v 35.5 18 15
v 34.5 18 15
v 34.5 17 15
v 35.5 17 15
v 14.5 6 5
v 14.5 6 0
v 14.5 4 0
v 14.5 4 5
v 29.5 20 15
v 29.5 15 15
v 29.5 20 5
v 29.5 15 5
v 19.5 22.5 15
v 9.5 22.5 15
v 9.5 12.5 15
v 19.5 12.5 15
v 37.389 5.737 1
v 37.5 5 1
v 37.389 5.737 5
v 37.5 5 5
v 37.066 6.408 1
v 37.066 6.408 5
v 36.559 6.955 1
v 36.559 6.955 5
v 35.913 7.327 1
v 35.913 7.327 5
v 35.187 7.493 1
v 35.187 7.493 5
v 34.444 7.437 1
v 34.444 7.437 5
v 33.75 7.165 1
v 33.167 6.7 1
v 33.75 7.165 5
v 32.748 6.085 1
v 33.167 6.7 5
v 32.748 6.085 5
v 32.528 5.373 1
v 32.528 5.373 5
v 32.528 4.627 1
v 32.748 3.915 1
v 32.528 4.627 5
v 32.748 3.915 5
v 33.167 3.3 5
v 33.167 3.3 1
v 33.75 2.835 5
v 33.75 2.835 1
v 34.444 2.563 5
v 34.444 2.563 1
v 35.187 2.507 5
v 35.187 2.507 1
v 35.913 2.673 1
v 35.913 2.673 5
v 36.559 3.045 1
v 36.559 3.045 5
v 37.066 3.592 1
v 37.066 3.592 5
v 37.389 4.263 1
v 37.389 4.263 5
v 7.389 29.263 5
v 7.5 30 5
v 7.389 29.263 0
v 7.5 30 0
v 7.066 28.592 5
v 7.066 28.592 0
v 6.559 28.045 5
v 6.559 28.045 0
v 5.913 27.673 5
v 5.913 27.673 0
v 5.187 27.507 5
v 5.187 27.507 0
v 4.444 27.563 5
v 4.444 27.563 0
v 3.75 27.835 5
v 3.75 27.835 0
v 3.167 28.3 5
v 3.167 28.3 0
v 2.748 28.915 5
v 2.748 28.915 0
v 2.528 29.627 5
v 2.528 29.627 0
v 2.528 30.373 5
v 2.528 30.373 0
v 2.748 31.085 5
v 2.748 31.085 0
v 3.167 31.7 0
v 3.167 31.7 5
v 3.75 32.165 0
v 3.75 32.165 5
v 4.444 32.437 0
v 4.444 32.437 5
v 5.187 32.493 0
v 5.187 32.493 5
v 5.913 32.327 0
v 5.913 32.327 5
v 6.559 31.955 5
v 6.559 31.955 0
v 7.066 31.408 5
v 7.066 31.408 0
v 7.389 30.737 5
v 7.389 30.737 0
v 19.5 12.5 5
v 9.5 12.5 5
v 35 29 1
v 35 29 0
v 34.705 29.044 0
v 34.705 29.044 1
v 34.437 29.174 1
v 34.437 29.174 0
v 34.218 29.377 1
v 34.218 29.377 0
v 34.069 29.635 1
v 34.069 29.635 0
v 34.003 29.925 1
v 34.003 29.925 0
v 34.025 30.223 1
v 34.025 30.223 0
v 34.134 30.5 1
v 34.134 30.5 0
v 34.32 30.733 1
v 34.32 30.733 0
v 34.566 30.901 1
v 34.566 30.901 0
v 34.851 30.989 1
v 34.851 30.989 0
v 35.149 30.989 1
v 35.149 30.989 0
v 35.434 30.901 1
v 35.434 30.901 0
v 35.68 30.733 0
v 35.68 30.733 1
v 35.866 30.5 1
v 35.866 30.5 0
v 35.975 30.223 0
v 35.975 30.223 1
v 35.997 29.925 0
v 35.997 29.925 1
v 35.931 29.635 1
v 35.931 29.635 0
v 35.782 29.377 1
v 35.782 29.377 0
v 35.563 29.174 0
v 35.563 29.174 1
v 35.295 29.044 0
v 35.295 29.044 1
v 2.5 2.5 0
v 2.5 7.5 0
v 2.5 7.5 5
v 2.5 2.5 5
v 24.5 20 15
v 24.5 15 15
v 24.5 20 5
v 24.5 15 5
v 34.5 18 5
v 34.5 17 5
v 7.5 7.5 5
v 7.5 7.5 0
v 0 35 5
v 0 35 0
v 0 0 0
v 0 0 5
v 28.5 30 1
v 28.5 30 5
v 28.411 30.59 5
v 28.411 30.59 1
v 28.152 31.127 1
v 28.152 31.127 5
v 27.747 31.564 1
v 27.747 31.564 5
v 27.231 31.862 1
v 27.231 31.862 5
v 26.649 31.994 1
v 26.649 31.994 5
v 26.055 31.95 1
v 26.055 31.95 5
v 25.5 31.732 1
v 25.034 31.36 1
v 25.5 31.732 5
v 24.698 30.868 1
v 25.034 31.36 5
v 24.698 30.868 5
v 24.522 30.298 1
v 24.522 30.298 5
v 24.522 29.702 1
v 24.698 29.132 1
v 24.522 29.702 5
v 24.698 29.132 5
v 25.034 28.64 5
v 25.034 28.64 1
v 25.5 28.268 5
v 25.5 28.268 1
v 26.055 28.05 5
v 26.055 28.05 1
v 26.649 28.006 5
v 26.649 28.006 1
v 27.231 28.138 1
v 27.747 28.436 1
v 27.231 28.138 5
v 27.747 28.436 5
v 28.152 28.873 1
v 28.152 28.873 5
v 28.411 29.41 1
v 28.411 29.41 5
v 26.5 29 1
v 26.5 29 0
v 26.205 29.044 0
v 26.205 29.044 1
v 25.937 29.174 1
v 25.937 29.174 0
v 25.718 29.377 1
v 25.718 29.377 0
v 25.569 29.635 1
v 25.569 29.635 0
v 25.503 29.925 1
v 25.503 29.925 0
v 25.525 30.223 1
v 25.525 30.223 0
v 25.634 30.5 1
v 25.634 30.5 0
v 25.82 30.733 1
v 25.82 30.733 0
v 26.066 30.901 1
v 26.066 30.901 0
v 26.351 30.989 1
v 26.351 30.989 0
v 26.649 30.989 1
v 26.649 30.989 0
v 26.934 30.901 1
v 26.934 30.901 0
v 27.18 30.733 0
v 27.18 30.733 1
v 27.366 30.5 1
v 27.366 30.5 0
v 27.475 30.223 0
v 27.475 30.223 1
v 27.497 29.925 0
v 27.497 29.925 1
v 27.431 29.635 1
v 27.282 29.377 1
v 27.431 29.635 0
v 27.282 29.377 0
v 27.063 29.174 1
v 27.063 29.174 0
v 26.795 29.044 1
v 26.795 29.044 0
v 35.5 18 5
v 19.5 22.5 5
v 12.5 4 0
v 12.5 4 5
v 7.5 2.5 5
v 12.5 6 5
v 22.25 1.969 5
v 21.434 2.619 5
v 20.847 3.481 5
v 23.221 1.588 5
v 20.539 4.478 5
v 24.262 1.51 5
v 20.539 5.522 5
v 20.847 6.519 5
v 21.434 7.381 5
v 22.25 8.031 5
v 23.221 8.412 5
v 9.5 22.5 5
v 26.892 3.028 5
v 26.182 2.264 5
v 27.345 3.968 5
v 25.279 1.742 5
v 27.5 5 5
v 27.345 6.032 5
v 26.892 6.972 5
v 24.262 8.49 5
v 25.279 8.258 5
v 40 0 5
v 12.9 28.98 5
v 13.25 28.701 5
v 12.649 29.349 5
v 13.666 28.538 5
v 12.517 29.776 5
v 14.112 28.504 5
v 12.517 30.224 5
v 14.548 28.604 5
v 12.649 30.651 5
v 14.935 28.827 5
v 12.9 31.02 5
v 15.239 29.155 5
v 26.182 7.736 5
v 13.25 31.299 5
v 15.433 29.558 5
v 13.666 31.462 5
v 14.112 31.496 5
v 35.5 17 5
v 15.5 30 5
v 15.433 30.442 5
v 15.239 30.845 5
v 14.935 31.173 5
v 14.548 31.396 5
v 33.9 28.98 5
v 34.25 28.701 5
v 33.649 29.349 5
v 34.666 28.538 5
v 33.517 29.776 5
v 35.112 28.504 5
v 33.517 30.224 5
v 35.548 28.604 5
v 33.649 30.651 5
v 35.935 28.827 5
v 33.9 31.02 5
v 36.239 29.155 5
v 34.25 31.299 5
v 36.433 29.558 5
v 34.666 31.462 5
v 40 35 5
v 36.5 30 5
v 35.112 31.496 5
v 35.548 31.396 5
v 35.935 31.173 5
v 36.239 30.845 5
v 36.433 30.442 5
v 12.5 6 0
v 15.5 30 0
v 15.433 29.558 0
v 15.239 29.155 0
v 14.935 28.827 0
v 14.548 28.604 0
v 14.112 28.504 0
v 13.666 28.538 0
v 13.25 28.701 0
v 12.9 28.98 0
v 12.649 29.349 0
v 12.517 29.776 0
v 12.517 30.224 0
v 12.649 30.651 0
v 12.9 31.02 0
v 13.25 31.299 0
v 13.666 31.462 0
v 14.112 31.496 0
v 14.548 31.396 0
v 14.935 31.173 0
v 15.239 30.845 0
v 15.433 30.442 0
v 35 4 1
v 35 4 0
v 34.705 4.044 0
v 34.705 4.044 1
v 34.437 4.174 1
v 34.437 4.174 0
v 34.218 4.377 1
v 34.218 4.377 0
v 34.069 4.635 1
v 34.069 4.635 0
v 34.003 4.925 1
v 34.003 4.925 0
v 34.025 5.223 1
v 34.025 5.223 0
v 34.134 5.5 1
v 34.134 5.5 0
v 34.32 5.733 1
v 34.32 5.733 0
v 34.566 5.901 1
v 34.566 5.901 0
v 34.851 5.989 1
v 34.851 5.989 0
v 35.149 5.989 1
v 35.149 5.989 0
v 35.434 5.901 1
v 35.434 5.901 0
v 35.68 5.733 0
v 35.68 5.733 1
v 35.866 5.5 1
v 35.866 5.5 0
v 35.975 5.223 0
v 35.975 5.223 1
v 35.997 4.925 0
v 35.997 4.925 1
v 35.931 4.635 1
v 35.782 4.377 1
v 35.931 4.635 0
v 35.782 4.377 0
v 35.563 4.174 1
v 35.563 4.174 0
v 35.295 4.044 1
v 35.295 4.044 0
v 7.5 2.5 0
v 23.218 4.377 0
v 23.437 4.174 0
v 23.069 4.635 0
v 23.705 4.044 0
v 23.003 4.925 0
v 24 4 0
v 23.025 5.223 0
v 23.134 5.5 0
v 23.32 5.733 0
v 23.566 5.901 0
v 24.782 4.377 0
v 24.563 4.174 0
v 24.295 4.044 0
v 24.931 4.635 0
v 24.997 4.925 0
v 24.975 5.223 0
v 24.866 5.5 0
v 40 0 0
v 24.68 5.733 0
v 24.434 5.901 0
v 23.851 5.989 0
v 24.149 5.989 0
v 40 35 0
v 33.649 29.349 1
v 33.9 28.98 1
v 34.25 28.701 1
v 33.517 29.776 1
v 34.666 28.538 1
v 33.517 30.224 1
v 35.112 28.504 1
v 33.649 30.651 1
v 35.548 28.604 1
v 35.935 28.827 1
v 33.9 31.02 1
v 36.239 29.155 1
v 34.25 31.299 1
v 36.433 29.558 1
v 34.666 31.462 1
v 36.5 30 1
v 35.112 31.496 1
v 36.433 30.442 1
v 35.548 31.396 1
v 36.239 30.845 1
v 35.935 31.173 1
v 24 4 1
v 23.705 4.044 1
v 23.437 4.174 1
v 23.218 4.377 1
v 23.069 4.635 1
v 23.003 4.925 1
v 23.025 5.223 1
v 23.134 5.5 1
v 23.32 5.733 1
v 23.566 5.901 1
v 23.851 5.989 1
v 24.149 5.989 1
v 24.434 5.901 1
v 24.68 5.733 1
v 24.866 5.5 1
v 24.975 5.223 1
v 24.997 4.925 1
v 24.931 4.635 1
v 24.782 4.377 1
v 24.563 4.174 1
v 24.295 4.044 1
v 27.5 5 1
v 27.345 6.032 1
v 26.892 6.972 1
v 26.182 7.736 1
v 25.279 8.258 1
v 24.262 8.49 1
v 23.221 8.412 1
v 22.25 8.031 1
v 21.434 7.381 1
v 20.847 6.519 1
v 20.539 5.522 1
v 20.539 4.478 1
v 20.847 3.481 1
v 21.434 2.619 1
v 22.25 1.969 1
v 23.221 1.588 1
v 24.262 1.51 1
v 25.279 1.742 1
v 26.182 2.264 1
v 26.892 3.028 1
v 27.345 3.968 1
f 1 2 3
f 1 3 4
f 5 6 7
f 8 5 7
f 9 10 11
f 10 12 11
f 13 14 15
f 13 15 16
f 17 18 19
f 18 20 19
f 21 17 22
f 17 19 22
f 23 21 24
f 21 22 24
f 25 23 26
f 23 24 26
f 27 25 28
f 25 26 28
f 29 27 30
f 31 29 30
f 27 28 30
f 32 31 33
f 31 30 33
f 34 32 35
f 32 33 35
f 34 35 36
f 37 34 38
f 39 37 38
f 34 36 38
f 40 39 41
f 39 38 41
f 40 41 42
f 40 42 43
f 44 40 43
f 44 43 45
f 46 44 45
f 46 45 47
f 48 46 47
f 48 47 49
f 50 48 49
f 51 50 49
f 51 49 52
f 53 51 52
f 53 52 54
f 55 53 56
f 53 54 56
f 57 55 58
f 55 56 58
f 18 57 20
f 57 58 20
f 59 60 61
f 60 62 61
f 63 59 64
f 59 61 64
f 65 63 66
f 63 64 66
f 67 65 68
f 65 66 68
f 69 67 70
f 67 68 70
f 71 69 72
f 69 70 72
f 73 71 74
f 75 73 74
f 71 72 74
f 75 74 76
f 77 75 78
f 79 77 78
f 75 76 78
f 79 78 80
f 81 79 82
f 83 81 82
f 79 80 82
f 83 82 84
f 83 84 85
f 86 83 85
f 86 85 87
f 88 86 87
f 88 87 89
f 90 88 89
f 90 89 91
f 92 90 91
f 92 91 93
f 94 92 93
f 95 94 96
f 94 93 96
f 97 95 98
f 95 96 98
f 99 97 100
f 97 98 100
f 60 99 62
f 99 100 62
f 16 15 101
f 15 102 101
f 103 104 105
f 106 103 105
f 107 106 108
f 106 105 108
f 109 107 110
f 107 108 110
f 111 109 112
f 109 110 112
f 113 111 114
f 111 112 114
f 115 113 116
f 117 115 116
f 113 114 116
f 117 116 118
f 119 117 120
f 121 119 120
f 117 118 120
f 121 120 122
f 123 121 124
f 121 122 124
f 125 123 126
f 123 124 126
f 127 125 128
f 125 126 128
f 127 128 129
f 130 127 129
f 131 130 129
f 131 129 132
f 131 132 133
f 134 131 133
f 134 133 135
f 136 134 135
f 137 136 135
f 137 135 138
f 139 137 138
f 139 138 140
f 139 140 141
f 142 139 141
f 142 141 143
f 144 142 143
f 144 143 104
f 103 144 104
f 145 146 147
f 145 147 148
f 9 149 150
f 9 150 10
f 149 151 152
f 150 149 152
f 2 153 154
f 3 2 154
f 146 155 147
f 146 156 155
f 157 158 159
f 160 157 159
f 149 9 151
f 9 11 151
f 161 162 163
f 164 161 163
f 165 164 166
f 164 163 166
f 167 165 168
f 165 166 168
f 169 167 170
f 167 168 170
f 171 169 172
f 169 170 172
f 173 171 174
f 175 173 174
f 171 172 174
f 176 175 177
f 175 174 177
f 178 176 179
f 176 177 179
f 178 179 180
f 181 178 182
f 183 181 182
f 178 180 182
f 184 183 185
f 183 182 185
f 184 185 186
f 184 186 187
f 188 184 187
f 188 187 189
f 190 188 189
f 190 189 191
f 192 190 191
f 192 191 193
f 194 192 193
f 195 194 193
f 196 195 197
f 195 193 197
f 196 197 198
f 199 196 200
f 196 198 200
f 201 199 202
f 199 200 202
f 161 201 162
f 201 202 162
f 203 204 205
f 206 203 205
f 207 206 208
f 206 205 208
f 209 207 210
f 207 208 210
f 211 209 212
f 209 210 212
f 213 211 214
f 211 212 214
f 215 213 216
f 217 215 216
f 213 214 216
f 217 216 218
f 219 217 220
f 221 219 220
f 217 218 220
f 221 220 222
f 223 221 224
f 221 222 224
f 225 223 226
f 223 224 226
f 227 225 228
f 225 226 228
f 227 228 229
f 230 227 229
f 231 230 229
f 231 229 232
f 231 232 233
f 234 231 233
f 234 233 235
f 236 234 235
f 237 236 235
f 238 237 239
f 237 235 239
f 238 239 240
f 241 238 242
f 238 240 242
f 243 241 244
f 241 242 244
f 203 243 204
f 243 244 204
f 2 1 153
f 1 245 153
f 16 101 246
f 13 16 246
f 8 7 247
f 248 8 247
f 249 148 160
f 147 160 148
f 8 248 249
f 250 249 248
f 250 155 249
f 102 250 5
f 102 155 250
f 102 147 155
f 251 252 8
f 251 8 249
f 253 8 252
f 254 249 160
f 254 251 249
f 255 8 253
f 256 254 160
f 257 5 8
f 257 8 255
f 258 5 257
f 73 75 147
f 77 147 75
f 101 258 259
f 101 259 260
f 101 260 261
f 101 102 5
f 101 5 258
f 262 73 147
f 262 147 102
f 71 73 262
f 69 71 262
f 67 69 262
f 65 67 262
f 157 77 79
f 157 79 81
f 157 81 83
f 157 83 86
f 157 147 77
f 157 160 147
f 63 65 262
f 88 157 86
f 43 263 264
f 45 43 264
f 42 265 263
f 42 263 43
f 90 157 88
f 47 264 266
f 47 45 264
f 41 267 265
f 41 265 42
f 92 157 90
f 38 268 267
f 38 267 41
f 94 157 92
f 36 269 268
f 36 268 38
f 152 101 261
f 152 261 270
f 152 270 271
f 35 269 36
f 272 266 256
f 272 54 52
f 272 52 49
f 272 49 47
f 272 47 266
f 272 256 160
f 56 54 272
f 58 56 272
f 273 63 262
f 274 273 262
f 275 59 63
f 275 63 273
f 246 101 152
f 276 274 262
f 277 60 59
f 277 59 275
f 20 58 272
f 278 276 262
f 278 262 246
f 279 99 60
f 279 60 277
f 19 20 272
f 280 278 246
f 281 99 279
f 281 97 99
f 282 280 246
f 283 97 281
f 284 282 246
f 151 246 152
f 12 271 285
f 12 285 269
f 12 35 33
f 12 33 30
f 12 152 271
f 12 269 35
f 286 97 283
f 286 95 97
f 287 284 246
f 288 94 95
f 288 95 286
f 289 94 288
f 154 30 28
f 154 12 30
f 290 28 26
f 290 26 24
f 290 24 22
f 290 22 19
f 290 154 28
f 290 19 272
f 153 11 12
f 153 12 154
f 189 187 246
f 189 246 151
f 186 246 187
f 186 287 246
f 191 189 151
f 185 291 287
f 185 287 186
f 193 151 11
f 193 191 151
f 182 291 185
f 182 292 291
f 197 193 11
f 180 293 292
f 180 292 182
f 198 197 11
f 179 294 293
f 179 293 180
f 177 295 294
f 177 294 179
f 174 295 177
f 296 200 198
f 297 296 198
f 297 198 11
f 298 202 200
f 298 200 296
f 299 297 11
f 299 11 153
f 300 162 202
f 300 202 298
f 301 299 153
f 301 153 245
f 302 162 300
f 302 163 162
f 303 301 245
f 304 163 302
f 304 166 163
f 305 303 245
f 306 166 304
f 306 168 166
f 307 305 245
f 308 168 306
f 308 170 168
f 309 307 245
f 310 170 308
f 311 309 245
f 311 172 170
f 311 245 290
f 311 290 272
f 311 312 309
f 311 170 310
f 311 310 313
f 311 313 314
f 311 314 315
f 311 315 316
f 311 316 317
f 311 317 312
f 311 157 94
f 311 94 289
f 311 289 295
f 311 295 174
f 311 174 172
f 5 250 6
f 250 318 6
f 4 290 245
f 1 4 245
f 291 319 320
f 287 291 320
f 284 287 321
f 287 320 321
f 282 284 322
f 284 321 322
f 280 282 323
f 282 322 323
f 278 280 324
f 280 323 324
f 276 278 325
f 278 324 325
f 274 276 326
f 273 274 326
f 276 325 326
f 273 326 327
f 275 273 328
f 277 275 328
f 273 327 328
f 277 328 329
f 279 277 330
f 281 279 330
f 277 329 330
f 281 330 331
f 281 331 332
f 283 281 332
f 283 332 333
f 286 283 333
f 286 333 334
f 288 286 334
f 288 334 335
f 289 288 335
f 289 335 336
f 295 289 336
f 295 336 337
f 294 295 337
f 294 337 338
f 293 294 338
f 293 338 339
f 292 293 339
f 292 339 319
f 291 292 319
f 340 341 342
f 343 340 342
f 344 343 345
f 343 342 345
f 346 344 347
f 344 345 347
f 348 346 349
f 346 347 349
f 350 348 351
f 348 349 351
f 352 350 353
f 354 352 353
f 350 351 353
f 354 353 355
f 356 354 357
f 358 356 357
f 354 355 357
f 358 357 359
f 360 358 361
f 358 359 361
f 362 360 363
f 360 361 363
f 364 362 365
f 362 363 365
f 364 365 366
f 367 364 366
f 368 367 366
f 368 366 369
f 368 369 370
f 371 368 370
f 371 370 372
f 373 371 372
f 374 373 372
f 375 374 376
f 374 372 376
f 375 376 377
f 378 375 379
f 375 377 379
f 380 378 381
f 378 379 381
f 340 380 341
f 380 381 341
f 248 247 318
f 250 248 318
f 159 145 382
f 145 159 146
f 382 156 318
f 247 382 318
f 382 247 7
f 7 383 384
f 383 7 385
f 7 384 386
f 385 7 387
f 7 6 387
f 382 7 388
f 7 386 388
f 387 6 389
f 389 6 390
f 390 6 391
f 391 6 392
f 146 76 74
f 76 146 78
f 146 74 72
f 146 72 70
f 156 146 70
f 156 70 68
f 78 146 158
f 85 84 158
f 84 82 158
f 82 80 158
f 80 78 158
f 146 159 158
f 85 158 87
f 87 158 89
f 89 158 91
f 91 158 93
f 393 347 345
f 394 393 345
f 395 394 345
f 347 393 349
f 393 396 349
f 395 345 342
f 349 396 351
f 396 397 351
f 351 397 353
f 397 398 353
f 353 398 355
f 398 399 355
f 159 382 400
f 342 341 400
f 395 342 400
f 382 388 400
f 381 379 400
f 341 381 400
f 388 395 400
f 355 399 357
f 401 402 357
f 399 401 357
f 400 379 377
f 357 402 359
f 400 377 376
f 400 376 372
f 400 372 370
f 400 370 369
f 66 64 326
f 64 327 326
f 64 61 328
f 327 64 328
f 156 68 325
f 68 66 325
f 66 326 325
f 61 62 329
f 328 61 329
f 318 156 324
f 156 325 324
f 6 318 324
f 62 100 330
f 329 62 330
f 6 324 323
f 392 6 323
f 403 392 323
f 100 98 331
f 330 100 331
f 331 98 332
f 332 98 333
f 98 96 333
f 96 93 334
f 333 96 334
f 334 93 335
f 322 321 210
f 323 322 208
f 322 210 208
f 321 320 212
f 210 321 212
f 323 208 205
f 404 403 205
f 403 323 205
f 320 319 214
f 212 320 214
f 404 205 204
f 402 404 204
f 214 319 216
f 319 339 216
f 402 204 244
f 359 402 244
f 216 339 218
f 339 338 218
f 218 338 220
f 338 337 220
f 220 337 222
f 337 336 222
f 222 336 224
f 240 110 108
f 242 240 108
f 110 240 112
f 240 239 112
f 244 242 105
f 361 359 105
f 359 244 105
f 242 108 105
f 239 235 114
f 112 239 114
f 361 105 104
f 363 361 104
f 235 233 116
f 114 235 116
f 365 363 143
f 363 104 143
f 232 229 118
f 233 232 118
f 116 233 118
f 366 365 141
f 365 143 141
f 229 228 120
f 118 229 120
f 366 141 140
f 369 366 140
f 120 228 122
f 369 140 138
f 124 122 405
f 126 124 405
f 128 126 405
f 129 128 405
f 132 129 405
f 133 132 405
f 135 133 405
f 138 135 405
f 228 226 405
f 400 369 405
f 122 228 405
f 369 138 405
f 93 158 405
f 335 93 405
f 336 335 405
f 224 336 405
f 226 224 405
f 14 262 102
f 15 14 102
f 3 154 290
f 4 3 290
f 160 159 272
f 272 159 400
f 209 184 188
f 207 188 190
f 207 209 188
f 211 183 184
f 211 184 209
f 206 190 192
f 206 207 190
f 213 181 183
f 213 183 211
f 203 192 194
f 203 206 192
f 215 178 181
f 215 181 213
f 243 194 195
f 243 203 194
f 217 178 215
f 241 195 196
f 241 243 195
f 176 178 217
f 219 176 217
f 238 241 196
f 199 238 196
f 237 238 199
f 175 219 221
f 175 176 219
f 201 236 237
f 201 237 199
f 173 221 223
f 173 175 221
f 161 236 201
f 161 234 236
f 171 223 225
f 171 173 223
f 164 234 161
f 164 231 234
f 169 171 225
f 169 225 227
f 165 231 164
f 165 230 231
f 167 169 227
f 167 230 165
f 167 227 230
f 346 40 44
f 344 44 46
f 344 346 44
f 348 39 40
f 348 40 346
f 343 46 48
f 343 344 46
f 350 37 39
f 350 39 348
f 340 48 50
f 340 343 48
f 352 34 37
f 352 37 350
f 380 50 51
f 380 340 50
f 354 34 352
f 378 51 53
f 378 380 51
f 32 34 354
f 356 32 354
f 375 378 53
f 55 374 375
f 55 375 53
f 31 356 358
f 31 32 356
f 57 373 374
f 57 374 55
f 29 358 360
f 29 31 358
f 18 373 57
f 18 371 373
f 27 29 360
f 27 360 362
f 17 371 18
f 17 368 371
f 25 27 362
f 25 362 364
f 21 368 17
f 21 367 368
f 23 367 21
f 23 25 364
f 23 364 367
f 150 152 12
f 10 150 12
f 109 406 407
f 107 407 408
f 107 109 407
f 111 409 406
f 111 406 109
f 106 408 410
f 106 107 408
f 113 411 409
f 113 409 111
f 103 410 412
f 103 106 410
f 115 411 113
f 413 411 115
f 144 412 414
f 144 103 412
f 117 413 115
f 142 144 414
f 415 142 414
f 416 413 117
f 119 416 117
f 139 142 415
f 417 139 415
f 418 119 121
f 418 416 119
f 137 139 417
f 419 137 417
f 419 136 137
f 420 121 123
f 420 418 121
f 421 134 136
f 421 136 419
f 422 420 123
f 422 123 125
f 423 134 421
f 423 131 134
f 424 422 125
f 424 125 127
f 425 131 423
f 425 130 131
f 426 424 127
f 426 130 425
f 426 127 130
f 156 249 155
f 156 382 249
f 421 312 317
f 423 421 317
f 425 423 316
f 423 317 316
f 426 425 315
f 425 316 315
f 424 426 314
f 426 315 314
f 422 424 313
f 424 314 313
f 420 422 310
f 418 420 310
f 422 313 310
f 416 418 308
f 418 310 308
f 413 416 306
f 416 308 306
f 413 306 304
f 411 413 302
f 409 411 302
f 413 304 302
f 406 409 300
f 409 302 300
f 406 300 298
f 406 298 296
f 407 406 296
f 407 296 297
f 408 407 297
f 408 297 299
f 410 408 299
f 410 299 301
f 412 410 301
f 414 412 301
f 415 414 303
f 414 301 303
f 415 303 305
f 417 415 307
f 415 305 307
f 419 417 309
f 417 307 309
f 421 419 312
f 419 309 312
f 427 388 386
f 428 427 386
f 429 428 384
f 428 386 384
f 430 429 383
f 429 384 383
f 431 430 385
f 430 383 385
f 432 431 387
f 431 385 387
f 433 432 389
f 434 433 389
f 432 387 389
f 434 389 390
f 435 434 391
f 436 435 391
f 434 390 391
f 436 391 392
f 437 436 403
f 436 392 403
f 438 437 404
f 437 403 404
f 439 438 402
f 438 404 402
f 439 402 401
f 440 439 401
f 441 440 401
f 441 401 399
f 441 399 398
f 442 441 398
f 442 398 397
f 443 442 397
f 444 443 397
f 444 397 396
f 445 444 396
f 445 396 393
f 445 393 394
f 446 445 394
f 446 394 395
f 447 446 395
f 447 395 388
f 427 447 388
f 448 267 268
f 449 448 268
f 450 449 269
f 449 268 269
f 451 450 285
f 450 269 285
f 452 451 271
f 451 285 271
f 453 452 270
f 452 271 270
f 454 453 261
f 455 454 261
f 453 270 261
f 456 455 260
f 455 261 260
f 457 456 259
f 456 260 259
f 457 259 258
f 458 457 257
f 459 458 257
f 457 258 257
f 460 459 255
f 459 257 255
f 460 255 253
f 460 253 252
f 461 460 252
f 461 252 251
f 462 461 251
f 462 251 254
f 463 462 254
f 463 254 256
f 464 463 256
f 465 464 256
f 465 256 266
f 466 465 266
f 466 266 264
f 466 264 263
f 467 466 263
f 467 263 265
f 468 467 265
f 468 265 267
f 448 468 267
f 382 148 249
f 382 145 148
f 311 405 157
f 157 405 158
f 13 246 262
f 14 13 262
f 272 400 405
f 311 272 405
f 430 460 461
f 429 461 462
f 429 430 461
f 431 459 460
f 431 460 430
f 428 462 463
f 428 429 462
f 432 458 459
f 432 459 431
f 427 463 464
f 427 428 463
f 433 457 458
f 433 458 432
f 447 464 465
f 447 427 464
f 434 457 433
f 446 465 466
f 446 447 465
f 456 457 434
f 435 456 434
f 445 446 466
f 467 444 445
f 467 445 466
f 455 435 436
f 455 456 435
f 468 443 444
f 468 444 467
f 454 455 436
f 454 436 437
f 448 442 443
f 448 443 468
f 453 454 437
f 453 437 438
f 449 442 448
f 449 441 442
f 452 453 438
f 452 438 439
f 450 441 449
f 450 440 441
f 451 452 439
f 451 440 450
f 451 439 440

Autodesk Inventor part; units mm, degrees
ref_plane "YZ Plane" through (0, 0, 0) normal (1, 0, 0) x (0, 1, 0)
ref_plane "XZ Plane" through (0, 0, 0) normal (0, 1, 0) x (-1, 0, 0)
ref_plane "XY Plane" through (0, 0, 0) normal (0, 0, 1) x (1, 0, 0)
sketch "Эскиз1" plane through (0, 0, 0) normal (0, 0, 1) x (1, 0, 0)
  line L0 (0, 0) -> (40, 0)
  line L1 (40, 0) -> (40, 35)
  line L2 (40, 35) -> (0, 35)
  line L3 (0, 35) -> (0, 0)
  line L4 (0, 17.5) -> (40, 17.5)
  line L5 (5, 5) -> (35, 5)
  line L6 (35, 5) -> (35, 30)
  line L7 (35, 30) -> (5, 30)
  line L8 (5, 30) -> (5, 5)
  line L9 (5, 5) -> (35, 30) construction
  line L10 (35, 5) -> (5, 30) construction
  circle A0 centre (5, 30) radius 2.5
  line L11 (5, 30) -> (14, 30)
  circle A1 centre (14, 30) radius 1.5
  line L12 (2.5, 2.5) -> (7.5, 2.5)
  line L13 (7.5, 2.5) -> (7.5, 7.5)
  line L14 (7.5, 7.5) -> (2.5, 7.5)
  line L15 (2.5, 7.5) -> (2.5, 2.5)
  line L16 (2.5, 2.5) -> (7.5, 7.5) construction
  line L17 (7.5, 2.5) -> (2.5, 7.5) construction
  line L18 (5, 5) -> (13.5, 5)
  line L19 (12.5, 6) -> (14.5, 6)
  line L20 (14.5, 6) -> (14.5, 4)
  line L21 (14.5, 4) -> (12.5, 4)
  line L22 (12.5, 4) -> (12.5, 6)
  line L23 (12.5, 6) -> (14.5, 4) construction
  line L24 (14.5, 6) -> (12.5, 4) construction
  point P0 (20, 17.5)
  dimension "d0" = 40
  dimension "d1" = 35
  dimension "d2" = 30
  dimension "d3" = 25
  dimension "d4" = 5
  dimension "d5" = 9
  dimension "d6" = 3
  dimension "d7" = 5
  dimension "d8" = 5
  dimension "d9" = 8.5
  dimension "d10" = 2
  dimension "d11" = 2
extrude "Выдавливание1" add sketch "Эскиз1" along normal blind 5 contours L3 L4 L8 L14 L15 L12 L13 L5 L22 L21 L20 L6 L1 L0 | L3 L2 L1 L4 L6 L7 A1 A0 L8 | L8 A0 L7 A1 L6 L4 | L4 L6 L5 L20 L19 L22 L13 L14 L8
sketch "Эскиз3" plane through (0, 0, 5) normal (0, 0, 1) x (1, 0, 0)
  line L0 (0, 35) -> (0, 0) projected
  line L1 (0, 17.5) -> (40, 17.5)
  line L2 (40, 0) -> (40, 35) projected
  line L3 (40, 0) -> (40, 35) projected
  line L4 (40, 35) -> (0, 35) projected
  line L5 (0, 35) -> (0, 0) projected
  line L6 (0, 0) -> (40, 0) projected
  line L7 (7.5, 7.5) -> (7.5, 2.5) projected
  line L8 (7.5, 2.5) -> (2.5, 2.5) projected
  line L9 (2.5, 2.5) -> (2.5, 7.5) projected
  line L10 (2.5, 7.5) -> (7.5, 7.5) projected
  line L11 (14.5, 4) -> (12.5, 4) projected
  line L12 (12.5, 4) -> (12.5, 6) projected
  line L13 (12.5, 6) -> (14.5, 6) projected
  line L14 (14.5, 6) -> (14.5, 4) projected
  circle A0 centre (14, 30) radius 1.5 projected
  circle A1 centre (5, 30) radius 2.5 projected
  line L15 (5, 5) -> (35, 5)
  line L16 (35, 5) -> (35, 30)
  line L17 (35, 30) -> (5, 30)
  line L18 (5, 30) -> (5, 5)
  line L19 (5, 5) -> (35, 30) construction
  line L20 (35, 5) -> (5, 30) construction
  line L21 (34.5, 17) -> (35.5, 17)
  line L22 (35.5, 17) -> (35.5, 18)
  line L23 (35.5, 18) -> (34.5, 18)
  line L24 (34.5, 18) -> (34.5, 17)
  line L25 (34.5, 17) -> (35.5, 18) construction
  line L26 (35.5, 17) -> (34.5, 18) construction
  line L27 (35, 17.5) -> (27, 17.5)
  line L28 (24.5, 15) -> (29.5, 15)
  line L29 (29.5, 15) -> (29.5, 20)
  line L30 (29.5, 20) -> (24.5, 20)
  line L31 (24.5, 20) -> (24.5, 15)
  line L32 (24.5, 15) -> (29.5, 20) construction
  line L33 (29.5, 15) -> (24.5, 20) construction
  line L34 (27, 17.5) -> (14.5, 17.5)
  line L35 (9.5, 12.5) -> (19.5, 12.5)
  line L36 (19.5, 12.5) -> (19.5, 22.5)
  line L37 (19.5, 22.5) -> (9.5, 22.5)
  line L38 (9.5, 22.5) -> (9.5, 12.5)
  line L39 (9.5, 12.5) -> (19.5, 22.5) construction
  line L40 (19.5, 12.5) -> (9.5, 22.5) construction
  line L41 (24.5, 20) -> (29.5, 20)
  line L42 (29.5, 20) -> (29.5, 15)
  line L43 (29.5, 15) -> (24.5, 15)
  line L44 (24.5, 15) -> (24.5, 20)
  point P0 (20, 17.5)
  dimension "d14" = 35
  dimension "d15" = 40
  dimension "d16" = 30
  dimension "d17" = 25
  dimension "d18" = 1
  dimension "d19" = 1
  dimension "d20" = 8
  dimension "d21" = 5
  dimension "d22" = 5
  dimension "d23" = 12.5
  dimension "d24" = 10
  dimension "d25" = 10
extrude "Выдавливание2" add sketch "Эскиз3" along normal blind 10 contours L38 L37 L36 L1 | L1 L36 L35 L38 | L22 L21 L16 L1 | L1 L16 L23 L22 | L16 L21 L24 L1 | L1 L24 L23 L16 | L31 L30 L29 L1 | L1 L29 L28 L31
sketch "Эскиз4" plane through (0, 0, 5) normal (0, 0, 1) x (1, 0, 0)
  line L0 (34.5, 17) -> (34.5, 18) projected
  line L1 (34.5, 18) -> (35.5, 18) projected
  line L2 (35.5, 18) -> (35.5, 17) projected
  line L3 (35.5, 17) -> (34.5, 17) projected
  line L4 (19.5, 22.5) -> (19.5, 12.5) projected
  line L5 (19.5, 12.5) -> (9.5, 12.5) projected
  line L6 (9.5, 12.5) -> (9.5, 22.5) projected
  line L7 (9.5, 22.5) -> (19.5, 22.5) projected
  line L8 (24.5, 15) -> (24.5, 20) projected
  line L9 (24.5, 20) -> (29.5, 20) projected
  line L10 (29.5, 20) -> (29.5, 15) projected
  line L11 (29.5, 15) -> (24.5, 15) projected
  line L12 (0, 35) -> (0, 0) projected
  line L13 (0, 0) -> (40, 0) projected
  line L14 (40, 0) -> (40, 35) projected
  line L15 (40, 35) -> (0, 35) projected
  line L16 (2.5, 2.5) -> (2.5, 7.5) projected
  line L17 (2.5, 7.5) -> (7.5, 7.5) projected
  line L18 (7.5, 7.5) -> (7.5, 2.5) projected
  line L19 (7.5, 2.5) -> (2.5, 2.5) projected
  line L20 (12.5, 6) -> (14.5, 6) projected
  line L21 (14.5, 6) -> (14.5, 4) projected
  line L22 (14.5, 4) -> (12.5, 4) projected
  line L23 (12.5, 4) -> (12.5, 6) projected
  circle A0 centre (14, 30) radius 1.5 projected
  circle A1 centre (5, 30) radius 2.5 projected
  line L24 (0, 35) -> (0, 0) projected
  line L25 (0, 17.5) -> (40, 17.5)
  line L26 (40, 0) -> (40, 35) projected
  line L27 (5, 5) -> (35, 5)
  line L28 (35, 5) -> (35, 30)
  line L29 (35, 30) -> (5, 30)
  line L30 (5, 30) -> (5, 5)
  line L31 (5, 5) -> (35, 30) construction
  line L32 (35, 5) -> (5, 30) construction
  circle A2 centre (35, 30) radius 1.5
  line L33 (35, 30) -> (26.5, 30)
  circle A3 centre (26.5, 30) radius 2
  circle A4 centre (35, 5) radius 2.5
  line L34 (35, 5) -> (24, 5)
  circle A5 centre (24, 5) radius 3.5
  point P0 (20, 17.5)
  dimension "d28" = 30
  dimension "d29" = 25
  dimension "d30" = 35
  dimension "d31" = 40
  dimension "d32" = 3
  dimension "d33" = 8.5
  dimension "d34" = 4
  dimension "d35" = 5
  dimension "d36" = 11
  dimension "d37" = 7
extrude "Выдавливание3" cut sketch "Эскиз4" against normal blind 4 contours A4 L27 L28 | L28 L27 A4 | A2 L29 L28 | L28 L29 A2 | A5 L27 | L27 A5 | A3 L29 | L29 A3
sketch "Эскиз5" plane through (26.5, 30, 1) normal (0, 0, 1) x (1, 0, 0)
  circle A0 centre (0, 0) radius 2 projected
  circle A1 centre (8.5, 0) radius 1.5 projected
  circle A2 centre (-2.5, -25) radius 3.5 projected
  circle A3 centre (8.5, -25) radius 2.5 projected
  point P0 (-26.5, -30)
hole "Отверстие1" at (26.5, 30, 1) at (35, 30, 1) at (24, 5, 1) at (35, 5, 1) direction (0, 0, -1) diameter 2 end through all
properties part number "Тестовая модель (Валы, столбы, подшипники)"
